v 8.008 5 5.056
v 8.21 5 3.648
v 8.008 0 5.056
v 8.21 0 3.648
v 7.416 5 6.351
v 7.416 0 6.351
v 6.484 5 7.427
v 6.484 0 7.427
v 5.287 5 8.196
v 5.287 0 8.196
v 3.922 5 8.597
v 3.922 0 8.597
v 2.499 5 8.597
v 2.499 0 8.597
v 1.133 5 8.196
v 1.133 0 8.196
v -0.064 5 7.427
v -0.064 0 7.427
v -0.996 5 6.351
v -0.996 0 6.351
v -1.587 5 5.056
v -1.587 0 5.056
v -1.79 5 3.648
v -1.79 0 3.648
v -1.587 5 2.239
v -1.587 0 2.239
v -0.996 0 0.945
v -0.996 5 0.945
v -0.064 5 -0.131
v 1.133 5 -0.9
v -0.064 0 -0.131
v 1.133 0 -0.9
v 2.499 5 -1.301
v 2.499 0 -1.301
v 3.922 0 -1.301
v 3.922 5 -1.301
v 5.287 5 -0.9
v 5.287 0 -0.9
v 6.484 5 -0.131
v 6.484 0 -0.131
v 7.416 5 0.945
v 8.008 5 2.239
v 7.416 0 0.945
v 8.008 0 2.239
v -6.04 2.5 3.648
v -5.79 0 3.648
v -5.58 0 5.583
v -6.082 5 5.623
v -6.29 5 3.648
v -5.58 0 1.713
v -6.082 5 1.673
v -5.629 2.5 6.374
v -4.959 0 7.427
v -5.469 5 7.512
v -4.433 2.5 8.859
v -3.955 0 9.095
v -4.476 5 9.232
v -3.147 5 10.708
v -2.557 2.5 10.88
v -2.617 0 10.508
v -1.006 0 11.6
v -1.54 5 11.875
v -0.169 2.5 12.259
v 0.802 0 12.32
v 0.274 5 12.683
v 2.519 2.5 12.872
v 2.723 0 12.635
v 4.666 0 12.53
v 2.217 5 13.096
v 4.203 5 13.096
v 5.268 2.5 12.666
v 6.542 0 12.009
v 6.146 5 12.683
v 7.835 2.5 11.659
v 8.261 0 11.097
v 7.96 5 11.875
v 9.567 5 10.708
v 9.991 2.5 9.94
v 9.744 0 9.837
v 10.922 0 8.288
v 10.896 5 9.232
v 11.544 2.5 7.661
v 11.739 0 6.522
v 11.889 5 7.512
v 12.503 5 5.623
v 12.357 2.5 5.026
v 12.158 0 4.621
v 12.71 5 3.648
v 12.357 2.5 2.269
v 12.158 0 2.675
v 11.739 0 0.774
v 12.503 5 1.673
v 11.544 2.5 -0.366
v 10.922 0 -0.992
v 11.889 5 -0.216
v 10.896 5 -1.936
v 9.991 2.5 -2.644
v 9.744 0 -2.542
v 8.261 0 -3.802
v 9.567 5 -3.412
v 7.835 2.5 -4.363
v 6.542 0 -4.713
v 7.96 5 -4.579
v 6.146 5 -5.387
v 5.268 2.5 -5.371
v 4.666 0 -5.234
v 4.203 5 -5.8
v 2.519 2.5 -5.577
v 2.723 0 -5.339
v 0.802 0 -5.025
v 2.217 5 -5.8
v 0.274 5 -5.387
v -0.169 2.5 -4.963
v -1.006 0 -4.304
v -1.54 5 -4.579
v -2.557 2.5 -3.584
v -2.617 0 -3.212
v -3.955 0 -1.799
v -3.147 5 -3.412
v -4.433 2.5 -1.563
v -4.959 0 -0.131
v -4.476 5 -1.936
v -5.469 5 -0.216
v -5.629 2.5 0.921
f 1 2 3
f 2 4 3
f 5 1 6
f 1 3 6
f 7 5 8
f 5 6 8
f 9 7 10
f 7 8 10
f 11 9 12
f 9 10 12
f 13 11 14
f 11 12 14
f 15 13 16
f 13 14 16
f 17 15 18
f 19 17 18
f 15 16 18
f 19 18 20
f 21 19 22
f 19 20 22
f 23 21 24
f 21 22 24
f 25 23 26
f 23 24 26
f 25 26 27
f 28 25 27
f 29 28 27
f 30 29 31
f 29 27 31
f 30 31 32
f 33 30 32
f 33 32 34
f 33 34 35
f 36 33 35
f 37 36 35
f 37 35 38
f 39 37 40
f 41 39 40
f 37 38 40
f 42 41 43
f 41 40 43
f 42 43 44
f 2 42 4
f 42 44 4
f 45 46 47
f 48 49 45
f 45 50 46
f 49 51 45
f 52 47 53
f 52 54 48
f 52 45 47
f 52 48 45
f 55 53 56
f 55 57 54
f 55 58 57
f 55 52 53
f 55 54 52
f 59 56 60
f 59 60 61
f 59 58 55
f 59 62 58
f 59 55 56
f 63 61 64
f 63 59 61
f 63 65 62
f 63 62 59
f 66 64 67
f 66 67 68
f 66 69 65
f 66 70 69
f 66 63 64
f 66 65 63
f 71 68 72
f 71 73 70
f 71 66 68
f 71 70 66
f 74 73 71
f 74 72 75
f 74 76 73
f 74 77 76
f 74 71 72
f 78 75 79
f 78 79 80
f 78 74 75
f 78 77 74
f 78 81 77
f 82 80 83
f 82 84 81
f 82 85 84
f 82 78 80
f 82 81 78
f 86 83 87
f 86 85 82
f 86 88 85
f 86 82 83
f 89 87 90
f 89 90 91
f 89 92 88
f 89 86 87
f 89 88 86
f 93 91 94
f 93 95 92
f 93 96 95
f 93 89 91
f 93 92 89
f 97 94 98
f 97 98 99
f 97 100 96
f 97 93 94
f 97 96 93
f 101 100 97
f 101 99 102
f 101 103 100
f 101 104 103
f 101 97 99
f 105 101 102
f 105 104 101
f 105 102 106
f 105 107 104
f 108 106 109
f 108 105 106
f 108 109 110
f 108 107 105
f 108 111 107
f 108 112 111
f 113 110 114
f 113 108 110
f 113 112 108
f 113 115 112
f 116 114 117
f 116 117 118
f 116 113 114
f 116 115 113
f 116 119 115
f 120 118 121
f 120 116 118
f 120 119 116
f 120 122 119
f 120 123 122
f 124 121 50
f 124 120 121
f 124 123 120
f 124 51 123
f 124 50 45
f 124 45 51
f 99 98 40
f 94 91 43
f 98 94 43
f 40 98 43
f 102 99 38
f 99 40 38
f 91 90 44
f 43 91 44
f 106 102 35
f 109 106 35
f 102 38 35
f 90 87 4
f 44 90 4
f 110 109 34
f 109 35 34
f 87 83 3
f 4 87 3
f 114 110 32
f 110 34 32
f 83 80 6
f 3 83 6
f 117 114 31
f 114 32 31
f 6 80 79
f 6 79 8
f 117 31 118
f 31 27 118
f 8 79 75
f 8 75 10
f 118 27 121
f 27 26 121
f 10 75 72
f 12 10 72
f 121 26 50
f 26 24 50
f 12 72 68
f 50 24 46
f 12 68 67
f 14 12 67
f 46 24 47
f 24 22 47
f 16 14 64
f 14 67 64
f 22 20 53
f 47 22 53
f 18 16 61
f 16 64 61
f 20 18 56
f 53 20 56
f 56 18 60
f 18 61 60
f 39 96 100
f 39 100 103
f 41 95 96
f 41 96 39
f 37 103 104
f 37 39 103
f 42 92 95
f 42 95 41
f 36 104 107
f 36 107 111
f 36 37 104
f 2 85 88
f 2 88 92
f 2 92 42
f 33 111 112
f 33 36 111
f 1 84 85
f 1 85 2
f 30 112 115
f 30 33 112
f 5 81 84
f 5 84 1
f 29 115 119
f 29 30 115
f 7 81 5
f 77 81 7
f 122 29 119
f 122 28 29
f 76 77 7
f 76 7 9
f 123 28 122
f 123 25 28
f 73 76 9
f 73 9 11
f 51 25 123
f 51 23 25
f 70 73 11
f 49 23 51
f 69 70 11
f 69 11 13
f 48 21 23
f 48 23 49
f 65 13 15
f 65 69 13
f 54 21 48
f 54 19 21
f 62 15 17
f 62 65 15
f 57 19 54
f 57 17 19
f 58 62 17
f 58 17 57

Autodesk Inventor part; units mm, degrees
ref_plane "YZ Plane" through (0, 0, 0) normal (1, 0, 0) x (0, 1, 0)
ref_plane "XZ Plane" through (0, 0, 0) normal (0, 1, 0) x (-1, 0, 0)
ref_plane "XY Plane" through (0, 0, 0) normal (0, 0, 1) x (1, 0, 0)
sketch "Sketch1" plane through (0, 0, 0) normal (0, 1, 0) x (-1, 0, 0)
  circle A0 centre (-3.2101, 3.6478) radius 9.5
  point P0 (0, 0)
  dimension "d0" = 19
extrude "Extrusion1" add sketch "Sketch1" along normal blind 5
chamfer "Chamfer1" distance 0.5 distance2 5 1 edges at (12.7101, 0, 3.6478) measured on face at (4.333, 0, 5.8992)
sketch "Sketch2" plane through (3.2101, 0, 3.6478) normal (0, -1, 0) x (1, 0, 0)
  circle A0 centre (0, 0) radius 5
  point P0 (-3.2101, -3.6478)
  dimension "d6" = 10
extrude "Extrusion2" cut sketch "Sketch2" against normal blind 5
properties part number "kop"
